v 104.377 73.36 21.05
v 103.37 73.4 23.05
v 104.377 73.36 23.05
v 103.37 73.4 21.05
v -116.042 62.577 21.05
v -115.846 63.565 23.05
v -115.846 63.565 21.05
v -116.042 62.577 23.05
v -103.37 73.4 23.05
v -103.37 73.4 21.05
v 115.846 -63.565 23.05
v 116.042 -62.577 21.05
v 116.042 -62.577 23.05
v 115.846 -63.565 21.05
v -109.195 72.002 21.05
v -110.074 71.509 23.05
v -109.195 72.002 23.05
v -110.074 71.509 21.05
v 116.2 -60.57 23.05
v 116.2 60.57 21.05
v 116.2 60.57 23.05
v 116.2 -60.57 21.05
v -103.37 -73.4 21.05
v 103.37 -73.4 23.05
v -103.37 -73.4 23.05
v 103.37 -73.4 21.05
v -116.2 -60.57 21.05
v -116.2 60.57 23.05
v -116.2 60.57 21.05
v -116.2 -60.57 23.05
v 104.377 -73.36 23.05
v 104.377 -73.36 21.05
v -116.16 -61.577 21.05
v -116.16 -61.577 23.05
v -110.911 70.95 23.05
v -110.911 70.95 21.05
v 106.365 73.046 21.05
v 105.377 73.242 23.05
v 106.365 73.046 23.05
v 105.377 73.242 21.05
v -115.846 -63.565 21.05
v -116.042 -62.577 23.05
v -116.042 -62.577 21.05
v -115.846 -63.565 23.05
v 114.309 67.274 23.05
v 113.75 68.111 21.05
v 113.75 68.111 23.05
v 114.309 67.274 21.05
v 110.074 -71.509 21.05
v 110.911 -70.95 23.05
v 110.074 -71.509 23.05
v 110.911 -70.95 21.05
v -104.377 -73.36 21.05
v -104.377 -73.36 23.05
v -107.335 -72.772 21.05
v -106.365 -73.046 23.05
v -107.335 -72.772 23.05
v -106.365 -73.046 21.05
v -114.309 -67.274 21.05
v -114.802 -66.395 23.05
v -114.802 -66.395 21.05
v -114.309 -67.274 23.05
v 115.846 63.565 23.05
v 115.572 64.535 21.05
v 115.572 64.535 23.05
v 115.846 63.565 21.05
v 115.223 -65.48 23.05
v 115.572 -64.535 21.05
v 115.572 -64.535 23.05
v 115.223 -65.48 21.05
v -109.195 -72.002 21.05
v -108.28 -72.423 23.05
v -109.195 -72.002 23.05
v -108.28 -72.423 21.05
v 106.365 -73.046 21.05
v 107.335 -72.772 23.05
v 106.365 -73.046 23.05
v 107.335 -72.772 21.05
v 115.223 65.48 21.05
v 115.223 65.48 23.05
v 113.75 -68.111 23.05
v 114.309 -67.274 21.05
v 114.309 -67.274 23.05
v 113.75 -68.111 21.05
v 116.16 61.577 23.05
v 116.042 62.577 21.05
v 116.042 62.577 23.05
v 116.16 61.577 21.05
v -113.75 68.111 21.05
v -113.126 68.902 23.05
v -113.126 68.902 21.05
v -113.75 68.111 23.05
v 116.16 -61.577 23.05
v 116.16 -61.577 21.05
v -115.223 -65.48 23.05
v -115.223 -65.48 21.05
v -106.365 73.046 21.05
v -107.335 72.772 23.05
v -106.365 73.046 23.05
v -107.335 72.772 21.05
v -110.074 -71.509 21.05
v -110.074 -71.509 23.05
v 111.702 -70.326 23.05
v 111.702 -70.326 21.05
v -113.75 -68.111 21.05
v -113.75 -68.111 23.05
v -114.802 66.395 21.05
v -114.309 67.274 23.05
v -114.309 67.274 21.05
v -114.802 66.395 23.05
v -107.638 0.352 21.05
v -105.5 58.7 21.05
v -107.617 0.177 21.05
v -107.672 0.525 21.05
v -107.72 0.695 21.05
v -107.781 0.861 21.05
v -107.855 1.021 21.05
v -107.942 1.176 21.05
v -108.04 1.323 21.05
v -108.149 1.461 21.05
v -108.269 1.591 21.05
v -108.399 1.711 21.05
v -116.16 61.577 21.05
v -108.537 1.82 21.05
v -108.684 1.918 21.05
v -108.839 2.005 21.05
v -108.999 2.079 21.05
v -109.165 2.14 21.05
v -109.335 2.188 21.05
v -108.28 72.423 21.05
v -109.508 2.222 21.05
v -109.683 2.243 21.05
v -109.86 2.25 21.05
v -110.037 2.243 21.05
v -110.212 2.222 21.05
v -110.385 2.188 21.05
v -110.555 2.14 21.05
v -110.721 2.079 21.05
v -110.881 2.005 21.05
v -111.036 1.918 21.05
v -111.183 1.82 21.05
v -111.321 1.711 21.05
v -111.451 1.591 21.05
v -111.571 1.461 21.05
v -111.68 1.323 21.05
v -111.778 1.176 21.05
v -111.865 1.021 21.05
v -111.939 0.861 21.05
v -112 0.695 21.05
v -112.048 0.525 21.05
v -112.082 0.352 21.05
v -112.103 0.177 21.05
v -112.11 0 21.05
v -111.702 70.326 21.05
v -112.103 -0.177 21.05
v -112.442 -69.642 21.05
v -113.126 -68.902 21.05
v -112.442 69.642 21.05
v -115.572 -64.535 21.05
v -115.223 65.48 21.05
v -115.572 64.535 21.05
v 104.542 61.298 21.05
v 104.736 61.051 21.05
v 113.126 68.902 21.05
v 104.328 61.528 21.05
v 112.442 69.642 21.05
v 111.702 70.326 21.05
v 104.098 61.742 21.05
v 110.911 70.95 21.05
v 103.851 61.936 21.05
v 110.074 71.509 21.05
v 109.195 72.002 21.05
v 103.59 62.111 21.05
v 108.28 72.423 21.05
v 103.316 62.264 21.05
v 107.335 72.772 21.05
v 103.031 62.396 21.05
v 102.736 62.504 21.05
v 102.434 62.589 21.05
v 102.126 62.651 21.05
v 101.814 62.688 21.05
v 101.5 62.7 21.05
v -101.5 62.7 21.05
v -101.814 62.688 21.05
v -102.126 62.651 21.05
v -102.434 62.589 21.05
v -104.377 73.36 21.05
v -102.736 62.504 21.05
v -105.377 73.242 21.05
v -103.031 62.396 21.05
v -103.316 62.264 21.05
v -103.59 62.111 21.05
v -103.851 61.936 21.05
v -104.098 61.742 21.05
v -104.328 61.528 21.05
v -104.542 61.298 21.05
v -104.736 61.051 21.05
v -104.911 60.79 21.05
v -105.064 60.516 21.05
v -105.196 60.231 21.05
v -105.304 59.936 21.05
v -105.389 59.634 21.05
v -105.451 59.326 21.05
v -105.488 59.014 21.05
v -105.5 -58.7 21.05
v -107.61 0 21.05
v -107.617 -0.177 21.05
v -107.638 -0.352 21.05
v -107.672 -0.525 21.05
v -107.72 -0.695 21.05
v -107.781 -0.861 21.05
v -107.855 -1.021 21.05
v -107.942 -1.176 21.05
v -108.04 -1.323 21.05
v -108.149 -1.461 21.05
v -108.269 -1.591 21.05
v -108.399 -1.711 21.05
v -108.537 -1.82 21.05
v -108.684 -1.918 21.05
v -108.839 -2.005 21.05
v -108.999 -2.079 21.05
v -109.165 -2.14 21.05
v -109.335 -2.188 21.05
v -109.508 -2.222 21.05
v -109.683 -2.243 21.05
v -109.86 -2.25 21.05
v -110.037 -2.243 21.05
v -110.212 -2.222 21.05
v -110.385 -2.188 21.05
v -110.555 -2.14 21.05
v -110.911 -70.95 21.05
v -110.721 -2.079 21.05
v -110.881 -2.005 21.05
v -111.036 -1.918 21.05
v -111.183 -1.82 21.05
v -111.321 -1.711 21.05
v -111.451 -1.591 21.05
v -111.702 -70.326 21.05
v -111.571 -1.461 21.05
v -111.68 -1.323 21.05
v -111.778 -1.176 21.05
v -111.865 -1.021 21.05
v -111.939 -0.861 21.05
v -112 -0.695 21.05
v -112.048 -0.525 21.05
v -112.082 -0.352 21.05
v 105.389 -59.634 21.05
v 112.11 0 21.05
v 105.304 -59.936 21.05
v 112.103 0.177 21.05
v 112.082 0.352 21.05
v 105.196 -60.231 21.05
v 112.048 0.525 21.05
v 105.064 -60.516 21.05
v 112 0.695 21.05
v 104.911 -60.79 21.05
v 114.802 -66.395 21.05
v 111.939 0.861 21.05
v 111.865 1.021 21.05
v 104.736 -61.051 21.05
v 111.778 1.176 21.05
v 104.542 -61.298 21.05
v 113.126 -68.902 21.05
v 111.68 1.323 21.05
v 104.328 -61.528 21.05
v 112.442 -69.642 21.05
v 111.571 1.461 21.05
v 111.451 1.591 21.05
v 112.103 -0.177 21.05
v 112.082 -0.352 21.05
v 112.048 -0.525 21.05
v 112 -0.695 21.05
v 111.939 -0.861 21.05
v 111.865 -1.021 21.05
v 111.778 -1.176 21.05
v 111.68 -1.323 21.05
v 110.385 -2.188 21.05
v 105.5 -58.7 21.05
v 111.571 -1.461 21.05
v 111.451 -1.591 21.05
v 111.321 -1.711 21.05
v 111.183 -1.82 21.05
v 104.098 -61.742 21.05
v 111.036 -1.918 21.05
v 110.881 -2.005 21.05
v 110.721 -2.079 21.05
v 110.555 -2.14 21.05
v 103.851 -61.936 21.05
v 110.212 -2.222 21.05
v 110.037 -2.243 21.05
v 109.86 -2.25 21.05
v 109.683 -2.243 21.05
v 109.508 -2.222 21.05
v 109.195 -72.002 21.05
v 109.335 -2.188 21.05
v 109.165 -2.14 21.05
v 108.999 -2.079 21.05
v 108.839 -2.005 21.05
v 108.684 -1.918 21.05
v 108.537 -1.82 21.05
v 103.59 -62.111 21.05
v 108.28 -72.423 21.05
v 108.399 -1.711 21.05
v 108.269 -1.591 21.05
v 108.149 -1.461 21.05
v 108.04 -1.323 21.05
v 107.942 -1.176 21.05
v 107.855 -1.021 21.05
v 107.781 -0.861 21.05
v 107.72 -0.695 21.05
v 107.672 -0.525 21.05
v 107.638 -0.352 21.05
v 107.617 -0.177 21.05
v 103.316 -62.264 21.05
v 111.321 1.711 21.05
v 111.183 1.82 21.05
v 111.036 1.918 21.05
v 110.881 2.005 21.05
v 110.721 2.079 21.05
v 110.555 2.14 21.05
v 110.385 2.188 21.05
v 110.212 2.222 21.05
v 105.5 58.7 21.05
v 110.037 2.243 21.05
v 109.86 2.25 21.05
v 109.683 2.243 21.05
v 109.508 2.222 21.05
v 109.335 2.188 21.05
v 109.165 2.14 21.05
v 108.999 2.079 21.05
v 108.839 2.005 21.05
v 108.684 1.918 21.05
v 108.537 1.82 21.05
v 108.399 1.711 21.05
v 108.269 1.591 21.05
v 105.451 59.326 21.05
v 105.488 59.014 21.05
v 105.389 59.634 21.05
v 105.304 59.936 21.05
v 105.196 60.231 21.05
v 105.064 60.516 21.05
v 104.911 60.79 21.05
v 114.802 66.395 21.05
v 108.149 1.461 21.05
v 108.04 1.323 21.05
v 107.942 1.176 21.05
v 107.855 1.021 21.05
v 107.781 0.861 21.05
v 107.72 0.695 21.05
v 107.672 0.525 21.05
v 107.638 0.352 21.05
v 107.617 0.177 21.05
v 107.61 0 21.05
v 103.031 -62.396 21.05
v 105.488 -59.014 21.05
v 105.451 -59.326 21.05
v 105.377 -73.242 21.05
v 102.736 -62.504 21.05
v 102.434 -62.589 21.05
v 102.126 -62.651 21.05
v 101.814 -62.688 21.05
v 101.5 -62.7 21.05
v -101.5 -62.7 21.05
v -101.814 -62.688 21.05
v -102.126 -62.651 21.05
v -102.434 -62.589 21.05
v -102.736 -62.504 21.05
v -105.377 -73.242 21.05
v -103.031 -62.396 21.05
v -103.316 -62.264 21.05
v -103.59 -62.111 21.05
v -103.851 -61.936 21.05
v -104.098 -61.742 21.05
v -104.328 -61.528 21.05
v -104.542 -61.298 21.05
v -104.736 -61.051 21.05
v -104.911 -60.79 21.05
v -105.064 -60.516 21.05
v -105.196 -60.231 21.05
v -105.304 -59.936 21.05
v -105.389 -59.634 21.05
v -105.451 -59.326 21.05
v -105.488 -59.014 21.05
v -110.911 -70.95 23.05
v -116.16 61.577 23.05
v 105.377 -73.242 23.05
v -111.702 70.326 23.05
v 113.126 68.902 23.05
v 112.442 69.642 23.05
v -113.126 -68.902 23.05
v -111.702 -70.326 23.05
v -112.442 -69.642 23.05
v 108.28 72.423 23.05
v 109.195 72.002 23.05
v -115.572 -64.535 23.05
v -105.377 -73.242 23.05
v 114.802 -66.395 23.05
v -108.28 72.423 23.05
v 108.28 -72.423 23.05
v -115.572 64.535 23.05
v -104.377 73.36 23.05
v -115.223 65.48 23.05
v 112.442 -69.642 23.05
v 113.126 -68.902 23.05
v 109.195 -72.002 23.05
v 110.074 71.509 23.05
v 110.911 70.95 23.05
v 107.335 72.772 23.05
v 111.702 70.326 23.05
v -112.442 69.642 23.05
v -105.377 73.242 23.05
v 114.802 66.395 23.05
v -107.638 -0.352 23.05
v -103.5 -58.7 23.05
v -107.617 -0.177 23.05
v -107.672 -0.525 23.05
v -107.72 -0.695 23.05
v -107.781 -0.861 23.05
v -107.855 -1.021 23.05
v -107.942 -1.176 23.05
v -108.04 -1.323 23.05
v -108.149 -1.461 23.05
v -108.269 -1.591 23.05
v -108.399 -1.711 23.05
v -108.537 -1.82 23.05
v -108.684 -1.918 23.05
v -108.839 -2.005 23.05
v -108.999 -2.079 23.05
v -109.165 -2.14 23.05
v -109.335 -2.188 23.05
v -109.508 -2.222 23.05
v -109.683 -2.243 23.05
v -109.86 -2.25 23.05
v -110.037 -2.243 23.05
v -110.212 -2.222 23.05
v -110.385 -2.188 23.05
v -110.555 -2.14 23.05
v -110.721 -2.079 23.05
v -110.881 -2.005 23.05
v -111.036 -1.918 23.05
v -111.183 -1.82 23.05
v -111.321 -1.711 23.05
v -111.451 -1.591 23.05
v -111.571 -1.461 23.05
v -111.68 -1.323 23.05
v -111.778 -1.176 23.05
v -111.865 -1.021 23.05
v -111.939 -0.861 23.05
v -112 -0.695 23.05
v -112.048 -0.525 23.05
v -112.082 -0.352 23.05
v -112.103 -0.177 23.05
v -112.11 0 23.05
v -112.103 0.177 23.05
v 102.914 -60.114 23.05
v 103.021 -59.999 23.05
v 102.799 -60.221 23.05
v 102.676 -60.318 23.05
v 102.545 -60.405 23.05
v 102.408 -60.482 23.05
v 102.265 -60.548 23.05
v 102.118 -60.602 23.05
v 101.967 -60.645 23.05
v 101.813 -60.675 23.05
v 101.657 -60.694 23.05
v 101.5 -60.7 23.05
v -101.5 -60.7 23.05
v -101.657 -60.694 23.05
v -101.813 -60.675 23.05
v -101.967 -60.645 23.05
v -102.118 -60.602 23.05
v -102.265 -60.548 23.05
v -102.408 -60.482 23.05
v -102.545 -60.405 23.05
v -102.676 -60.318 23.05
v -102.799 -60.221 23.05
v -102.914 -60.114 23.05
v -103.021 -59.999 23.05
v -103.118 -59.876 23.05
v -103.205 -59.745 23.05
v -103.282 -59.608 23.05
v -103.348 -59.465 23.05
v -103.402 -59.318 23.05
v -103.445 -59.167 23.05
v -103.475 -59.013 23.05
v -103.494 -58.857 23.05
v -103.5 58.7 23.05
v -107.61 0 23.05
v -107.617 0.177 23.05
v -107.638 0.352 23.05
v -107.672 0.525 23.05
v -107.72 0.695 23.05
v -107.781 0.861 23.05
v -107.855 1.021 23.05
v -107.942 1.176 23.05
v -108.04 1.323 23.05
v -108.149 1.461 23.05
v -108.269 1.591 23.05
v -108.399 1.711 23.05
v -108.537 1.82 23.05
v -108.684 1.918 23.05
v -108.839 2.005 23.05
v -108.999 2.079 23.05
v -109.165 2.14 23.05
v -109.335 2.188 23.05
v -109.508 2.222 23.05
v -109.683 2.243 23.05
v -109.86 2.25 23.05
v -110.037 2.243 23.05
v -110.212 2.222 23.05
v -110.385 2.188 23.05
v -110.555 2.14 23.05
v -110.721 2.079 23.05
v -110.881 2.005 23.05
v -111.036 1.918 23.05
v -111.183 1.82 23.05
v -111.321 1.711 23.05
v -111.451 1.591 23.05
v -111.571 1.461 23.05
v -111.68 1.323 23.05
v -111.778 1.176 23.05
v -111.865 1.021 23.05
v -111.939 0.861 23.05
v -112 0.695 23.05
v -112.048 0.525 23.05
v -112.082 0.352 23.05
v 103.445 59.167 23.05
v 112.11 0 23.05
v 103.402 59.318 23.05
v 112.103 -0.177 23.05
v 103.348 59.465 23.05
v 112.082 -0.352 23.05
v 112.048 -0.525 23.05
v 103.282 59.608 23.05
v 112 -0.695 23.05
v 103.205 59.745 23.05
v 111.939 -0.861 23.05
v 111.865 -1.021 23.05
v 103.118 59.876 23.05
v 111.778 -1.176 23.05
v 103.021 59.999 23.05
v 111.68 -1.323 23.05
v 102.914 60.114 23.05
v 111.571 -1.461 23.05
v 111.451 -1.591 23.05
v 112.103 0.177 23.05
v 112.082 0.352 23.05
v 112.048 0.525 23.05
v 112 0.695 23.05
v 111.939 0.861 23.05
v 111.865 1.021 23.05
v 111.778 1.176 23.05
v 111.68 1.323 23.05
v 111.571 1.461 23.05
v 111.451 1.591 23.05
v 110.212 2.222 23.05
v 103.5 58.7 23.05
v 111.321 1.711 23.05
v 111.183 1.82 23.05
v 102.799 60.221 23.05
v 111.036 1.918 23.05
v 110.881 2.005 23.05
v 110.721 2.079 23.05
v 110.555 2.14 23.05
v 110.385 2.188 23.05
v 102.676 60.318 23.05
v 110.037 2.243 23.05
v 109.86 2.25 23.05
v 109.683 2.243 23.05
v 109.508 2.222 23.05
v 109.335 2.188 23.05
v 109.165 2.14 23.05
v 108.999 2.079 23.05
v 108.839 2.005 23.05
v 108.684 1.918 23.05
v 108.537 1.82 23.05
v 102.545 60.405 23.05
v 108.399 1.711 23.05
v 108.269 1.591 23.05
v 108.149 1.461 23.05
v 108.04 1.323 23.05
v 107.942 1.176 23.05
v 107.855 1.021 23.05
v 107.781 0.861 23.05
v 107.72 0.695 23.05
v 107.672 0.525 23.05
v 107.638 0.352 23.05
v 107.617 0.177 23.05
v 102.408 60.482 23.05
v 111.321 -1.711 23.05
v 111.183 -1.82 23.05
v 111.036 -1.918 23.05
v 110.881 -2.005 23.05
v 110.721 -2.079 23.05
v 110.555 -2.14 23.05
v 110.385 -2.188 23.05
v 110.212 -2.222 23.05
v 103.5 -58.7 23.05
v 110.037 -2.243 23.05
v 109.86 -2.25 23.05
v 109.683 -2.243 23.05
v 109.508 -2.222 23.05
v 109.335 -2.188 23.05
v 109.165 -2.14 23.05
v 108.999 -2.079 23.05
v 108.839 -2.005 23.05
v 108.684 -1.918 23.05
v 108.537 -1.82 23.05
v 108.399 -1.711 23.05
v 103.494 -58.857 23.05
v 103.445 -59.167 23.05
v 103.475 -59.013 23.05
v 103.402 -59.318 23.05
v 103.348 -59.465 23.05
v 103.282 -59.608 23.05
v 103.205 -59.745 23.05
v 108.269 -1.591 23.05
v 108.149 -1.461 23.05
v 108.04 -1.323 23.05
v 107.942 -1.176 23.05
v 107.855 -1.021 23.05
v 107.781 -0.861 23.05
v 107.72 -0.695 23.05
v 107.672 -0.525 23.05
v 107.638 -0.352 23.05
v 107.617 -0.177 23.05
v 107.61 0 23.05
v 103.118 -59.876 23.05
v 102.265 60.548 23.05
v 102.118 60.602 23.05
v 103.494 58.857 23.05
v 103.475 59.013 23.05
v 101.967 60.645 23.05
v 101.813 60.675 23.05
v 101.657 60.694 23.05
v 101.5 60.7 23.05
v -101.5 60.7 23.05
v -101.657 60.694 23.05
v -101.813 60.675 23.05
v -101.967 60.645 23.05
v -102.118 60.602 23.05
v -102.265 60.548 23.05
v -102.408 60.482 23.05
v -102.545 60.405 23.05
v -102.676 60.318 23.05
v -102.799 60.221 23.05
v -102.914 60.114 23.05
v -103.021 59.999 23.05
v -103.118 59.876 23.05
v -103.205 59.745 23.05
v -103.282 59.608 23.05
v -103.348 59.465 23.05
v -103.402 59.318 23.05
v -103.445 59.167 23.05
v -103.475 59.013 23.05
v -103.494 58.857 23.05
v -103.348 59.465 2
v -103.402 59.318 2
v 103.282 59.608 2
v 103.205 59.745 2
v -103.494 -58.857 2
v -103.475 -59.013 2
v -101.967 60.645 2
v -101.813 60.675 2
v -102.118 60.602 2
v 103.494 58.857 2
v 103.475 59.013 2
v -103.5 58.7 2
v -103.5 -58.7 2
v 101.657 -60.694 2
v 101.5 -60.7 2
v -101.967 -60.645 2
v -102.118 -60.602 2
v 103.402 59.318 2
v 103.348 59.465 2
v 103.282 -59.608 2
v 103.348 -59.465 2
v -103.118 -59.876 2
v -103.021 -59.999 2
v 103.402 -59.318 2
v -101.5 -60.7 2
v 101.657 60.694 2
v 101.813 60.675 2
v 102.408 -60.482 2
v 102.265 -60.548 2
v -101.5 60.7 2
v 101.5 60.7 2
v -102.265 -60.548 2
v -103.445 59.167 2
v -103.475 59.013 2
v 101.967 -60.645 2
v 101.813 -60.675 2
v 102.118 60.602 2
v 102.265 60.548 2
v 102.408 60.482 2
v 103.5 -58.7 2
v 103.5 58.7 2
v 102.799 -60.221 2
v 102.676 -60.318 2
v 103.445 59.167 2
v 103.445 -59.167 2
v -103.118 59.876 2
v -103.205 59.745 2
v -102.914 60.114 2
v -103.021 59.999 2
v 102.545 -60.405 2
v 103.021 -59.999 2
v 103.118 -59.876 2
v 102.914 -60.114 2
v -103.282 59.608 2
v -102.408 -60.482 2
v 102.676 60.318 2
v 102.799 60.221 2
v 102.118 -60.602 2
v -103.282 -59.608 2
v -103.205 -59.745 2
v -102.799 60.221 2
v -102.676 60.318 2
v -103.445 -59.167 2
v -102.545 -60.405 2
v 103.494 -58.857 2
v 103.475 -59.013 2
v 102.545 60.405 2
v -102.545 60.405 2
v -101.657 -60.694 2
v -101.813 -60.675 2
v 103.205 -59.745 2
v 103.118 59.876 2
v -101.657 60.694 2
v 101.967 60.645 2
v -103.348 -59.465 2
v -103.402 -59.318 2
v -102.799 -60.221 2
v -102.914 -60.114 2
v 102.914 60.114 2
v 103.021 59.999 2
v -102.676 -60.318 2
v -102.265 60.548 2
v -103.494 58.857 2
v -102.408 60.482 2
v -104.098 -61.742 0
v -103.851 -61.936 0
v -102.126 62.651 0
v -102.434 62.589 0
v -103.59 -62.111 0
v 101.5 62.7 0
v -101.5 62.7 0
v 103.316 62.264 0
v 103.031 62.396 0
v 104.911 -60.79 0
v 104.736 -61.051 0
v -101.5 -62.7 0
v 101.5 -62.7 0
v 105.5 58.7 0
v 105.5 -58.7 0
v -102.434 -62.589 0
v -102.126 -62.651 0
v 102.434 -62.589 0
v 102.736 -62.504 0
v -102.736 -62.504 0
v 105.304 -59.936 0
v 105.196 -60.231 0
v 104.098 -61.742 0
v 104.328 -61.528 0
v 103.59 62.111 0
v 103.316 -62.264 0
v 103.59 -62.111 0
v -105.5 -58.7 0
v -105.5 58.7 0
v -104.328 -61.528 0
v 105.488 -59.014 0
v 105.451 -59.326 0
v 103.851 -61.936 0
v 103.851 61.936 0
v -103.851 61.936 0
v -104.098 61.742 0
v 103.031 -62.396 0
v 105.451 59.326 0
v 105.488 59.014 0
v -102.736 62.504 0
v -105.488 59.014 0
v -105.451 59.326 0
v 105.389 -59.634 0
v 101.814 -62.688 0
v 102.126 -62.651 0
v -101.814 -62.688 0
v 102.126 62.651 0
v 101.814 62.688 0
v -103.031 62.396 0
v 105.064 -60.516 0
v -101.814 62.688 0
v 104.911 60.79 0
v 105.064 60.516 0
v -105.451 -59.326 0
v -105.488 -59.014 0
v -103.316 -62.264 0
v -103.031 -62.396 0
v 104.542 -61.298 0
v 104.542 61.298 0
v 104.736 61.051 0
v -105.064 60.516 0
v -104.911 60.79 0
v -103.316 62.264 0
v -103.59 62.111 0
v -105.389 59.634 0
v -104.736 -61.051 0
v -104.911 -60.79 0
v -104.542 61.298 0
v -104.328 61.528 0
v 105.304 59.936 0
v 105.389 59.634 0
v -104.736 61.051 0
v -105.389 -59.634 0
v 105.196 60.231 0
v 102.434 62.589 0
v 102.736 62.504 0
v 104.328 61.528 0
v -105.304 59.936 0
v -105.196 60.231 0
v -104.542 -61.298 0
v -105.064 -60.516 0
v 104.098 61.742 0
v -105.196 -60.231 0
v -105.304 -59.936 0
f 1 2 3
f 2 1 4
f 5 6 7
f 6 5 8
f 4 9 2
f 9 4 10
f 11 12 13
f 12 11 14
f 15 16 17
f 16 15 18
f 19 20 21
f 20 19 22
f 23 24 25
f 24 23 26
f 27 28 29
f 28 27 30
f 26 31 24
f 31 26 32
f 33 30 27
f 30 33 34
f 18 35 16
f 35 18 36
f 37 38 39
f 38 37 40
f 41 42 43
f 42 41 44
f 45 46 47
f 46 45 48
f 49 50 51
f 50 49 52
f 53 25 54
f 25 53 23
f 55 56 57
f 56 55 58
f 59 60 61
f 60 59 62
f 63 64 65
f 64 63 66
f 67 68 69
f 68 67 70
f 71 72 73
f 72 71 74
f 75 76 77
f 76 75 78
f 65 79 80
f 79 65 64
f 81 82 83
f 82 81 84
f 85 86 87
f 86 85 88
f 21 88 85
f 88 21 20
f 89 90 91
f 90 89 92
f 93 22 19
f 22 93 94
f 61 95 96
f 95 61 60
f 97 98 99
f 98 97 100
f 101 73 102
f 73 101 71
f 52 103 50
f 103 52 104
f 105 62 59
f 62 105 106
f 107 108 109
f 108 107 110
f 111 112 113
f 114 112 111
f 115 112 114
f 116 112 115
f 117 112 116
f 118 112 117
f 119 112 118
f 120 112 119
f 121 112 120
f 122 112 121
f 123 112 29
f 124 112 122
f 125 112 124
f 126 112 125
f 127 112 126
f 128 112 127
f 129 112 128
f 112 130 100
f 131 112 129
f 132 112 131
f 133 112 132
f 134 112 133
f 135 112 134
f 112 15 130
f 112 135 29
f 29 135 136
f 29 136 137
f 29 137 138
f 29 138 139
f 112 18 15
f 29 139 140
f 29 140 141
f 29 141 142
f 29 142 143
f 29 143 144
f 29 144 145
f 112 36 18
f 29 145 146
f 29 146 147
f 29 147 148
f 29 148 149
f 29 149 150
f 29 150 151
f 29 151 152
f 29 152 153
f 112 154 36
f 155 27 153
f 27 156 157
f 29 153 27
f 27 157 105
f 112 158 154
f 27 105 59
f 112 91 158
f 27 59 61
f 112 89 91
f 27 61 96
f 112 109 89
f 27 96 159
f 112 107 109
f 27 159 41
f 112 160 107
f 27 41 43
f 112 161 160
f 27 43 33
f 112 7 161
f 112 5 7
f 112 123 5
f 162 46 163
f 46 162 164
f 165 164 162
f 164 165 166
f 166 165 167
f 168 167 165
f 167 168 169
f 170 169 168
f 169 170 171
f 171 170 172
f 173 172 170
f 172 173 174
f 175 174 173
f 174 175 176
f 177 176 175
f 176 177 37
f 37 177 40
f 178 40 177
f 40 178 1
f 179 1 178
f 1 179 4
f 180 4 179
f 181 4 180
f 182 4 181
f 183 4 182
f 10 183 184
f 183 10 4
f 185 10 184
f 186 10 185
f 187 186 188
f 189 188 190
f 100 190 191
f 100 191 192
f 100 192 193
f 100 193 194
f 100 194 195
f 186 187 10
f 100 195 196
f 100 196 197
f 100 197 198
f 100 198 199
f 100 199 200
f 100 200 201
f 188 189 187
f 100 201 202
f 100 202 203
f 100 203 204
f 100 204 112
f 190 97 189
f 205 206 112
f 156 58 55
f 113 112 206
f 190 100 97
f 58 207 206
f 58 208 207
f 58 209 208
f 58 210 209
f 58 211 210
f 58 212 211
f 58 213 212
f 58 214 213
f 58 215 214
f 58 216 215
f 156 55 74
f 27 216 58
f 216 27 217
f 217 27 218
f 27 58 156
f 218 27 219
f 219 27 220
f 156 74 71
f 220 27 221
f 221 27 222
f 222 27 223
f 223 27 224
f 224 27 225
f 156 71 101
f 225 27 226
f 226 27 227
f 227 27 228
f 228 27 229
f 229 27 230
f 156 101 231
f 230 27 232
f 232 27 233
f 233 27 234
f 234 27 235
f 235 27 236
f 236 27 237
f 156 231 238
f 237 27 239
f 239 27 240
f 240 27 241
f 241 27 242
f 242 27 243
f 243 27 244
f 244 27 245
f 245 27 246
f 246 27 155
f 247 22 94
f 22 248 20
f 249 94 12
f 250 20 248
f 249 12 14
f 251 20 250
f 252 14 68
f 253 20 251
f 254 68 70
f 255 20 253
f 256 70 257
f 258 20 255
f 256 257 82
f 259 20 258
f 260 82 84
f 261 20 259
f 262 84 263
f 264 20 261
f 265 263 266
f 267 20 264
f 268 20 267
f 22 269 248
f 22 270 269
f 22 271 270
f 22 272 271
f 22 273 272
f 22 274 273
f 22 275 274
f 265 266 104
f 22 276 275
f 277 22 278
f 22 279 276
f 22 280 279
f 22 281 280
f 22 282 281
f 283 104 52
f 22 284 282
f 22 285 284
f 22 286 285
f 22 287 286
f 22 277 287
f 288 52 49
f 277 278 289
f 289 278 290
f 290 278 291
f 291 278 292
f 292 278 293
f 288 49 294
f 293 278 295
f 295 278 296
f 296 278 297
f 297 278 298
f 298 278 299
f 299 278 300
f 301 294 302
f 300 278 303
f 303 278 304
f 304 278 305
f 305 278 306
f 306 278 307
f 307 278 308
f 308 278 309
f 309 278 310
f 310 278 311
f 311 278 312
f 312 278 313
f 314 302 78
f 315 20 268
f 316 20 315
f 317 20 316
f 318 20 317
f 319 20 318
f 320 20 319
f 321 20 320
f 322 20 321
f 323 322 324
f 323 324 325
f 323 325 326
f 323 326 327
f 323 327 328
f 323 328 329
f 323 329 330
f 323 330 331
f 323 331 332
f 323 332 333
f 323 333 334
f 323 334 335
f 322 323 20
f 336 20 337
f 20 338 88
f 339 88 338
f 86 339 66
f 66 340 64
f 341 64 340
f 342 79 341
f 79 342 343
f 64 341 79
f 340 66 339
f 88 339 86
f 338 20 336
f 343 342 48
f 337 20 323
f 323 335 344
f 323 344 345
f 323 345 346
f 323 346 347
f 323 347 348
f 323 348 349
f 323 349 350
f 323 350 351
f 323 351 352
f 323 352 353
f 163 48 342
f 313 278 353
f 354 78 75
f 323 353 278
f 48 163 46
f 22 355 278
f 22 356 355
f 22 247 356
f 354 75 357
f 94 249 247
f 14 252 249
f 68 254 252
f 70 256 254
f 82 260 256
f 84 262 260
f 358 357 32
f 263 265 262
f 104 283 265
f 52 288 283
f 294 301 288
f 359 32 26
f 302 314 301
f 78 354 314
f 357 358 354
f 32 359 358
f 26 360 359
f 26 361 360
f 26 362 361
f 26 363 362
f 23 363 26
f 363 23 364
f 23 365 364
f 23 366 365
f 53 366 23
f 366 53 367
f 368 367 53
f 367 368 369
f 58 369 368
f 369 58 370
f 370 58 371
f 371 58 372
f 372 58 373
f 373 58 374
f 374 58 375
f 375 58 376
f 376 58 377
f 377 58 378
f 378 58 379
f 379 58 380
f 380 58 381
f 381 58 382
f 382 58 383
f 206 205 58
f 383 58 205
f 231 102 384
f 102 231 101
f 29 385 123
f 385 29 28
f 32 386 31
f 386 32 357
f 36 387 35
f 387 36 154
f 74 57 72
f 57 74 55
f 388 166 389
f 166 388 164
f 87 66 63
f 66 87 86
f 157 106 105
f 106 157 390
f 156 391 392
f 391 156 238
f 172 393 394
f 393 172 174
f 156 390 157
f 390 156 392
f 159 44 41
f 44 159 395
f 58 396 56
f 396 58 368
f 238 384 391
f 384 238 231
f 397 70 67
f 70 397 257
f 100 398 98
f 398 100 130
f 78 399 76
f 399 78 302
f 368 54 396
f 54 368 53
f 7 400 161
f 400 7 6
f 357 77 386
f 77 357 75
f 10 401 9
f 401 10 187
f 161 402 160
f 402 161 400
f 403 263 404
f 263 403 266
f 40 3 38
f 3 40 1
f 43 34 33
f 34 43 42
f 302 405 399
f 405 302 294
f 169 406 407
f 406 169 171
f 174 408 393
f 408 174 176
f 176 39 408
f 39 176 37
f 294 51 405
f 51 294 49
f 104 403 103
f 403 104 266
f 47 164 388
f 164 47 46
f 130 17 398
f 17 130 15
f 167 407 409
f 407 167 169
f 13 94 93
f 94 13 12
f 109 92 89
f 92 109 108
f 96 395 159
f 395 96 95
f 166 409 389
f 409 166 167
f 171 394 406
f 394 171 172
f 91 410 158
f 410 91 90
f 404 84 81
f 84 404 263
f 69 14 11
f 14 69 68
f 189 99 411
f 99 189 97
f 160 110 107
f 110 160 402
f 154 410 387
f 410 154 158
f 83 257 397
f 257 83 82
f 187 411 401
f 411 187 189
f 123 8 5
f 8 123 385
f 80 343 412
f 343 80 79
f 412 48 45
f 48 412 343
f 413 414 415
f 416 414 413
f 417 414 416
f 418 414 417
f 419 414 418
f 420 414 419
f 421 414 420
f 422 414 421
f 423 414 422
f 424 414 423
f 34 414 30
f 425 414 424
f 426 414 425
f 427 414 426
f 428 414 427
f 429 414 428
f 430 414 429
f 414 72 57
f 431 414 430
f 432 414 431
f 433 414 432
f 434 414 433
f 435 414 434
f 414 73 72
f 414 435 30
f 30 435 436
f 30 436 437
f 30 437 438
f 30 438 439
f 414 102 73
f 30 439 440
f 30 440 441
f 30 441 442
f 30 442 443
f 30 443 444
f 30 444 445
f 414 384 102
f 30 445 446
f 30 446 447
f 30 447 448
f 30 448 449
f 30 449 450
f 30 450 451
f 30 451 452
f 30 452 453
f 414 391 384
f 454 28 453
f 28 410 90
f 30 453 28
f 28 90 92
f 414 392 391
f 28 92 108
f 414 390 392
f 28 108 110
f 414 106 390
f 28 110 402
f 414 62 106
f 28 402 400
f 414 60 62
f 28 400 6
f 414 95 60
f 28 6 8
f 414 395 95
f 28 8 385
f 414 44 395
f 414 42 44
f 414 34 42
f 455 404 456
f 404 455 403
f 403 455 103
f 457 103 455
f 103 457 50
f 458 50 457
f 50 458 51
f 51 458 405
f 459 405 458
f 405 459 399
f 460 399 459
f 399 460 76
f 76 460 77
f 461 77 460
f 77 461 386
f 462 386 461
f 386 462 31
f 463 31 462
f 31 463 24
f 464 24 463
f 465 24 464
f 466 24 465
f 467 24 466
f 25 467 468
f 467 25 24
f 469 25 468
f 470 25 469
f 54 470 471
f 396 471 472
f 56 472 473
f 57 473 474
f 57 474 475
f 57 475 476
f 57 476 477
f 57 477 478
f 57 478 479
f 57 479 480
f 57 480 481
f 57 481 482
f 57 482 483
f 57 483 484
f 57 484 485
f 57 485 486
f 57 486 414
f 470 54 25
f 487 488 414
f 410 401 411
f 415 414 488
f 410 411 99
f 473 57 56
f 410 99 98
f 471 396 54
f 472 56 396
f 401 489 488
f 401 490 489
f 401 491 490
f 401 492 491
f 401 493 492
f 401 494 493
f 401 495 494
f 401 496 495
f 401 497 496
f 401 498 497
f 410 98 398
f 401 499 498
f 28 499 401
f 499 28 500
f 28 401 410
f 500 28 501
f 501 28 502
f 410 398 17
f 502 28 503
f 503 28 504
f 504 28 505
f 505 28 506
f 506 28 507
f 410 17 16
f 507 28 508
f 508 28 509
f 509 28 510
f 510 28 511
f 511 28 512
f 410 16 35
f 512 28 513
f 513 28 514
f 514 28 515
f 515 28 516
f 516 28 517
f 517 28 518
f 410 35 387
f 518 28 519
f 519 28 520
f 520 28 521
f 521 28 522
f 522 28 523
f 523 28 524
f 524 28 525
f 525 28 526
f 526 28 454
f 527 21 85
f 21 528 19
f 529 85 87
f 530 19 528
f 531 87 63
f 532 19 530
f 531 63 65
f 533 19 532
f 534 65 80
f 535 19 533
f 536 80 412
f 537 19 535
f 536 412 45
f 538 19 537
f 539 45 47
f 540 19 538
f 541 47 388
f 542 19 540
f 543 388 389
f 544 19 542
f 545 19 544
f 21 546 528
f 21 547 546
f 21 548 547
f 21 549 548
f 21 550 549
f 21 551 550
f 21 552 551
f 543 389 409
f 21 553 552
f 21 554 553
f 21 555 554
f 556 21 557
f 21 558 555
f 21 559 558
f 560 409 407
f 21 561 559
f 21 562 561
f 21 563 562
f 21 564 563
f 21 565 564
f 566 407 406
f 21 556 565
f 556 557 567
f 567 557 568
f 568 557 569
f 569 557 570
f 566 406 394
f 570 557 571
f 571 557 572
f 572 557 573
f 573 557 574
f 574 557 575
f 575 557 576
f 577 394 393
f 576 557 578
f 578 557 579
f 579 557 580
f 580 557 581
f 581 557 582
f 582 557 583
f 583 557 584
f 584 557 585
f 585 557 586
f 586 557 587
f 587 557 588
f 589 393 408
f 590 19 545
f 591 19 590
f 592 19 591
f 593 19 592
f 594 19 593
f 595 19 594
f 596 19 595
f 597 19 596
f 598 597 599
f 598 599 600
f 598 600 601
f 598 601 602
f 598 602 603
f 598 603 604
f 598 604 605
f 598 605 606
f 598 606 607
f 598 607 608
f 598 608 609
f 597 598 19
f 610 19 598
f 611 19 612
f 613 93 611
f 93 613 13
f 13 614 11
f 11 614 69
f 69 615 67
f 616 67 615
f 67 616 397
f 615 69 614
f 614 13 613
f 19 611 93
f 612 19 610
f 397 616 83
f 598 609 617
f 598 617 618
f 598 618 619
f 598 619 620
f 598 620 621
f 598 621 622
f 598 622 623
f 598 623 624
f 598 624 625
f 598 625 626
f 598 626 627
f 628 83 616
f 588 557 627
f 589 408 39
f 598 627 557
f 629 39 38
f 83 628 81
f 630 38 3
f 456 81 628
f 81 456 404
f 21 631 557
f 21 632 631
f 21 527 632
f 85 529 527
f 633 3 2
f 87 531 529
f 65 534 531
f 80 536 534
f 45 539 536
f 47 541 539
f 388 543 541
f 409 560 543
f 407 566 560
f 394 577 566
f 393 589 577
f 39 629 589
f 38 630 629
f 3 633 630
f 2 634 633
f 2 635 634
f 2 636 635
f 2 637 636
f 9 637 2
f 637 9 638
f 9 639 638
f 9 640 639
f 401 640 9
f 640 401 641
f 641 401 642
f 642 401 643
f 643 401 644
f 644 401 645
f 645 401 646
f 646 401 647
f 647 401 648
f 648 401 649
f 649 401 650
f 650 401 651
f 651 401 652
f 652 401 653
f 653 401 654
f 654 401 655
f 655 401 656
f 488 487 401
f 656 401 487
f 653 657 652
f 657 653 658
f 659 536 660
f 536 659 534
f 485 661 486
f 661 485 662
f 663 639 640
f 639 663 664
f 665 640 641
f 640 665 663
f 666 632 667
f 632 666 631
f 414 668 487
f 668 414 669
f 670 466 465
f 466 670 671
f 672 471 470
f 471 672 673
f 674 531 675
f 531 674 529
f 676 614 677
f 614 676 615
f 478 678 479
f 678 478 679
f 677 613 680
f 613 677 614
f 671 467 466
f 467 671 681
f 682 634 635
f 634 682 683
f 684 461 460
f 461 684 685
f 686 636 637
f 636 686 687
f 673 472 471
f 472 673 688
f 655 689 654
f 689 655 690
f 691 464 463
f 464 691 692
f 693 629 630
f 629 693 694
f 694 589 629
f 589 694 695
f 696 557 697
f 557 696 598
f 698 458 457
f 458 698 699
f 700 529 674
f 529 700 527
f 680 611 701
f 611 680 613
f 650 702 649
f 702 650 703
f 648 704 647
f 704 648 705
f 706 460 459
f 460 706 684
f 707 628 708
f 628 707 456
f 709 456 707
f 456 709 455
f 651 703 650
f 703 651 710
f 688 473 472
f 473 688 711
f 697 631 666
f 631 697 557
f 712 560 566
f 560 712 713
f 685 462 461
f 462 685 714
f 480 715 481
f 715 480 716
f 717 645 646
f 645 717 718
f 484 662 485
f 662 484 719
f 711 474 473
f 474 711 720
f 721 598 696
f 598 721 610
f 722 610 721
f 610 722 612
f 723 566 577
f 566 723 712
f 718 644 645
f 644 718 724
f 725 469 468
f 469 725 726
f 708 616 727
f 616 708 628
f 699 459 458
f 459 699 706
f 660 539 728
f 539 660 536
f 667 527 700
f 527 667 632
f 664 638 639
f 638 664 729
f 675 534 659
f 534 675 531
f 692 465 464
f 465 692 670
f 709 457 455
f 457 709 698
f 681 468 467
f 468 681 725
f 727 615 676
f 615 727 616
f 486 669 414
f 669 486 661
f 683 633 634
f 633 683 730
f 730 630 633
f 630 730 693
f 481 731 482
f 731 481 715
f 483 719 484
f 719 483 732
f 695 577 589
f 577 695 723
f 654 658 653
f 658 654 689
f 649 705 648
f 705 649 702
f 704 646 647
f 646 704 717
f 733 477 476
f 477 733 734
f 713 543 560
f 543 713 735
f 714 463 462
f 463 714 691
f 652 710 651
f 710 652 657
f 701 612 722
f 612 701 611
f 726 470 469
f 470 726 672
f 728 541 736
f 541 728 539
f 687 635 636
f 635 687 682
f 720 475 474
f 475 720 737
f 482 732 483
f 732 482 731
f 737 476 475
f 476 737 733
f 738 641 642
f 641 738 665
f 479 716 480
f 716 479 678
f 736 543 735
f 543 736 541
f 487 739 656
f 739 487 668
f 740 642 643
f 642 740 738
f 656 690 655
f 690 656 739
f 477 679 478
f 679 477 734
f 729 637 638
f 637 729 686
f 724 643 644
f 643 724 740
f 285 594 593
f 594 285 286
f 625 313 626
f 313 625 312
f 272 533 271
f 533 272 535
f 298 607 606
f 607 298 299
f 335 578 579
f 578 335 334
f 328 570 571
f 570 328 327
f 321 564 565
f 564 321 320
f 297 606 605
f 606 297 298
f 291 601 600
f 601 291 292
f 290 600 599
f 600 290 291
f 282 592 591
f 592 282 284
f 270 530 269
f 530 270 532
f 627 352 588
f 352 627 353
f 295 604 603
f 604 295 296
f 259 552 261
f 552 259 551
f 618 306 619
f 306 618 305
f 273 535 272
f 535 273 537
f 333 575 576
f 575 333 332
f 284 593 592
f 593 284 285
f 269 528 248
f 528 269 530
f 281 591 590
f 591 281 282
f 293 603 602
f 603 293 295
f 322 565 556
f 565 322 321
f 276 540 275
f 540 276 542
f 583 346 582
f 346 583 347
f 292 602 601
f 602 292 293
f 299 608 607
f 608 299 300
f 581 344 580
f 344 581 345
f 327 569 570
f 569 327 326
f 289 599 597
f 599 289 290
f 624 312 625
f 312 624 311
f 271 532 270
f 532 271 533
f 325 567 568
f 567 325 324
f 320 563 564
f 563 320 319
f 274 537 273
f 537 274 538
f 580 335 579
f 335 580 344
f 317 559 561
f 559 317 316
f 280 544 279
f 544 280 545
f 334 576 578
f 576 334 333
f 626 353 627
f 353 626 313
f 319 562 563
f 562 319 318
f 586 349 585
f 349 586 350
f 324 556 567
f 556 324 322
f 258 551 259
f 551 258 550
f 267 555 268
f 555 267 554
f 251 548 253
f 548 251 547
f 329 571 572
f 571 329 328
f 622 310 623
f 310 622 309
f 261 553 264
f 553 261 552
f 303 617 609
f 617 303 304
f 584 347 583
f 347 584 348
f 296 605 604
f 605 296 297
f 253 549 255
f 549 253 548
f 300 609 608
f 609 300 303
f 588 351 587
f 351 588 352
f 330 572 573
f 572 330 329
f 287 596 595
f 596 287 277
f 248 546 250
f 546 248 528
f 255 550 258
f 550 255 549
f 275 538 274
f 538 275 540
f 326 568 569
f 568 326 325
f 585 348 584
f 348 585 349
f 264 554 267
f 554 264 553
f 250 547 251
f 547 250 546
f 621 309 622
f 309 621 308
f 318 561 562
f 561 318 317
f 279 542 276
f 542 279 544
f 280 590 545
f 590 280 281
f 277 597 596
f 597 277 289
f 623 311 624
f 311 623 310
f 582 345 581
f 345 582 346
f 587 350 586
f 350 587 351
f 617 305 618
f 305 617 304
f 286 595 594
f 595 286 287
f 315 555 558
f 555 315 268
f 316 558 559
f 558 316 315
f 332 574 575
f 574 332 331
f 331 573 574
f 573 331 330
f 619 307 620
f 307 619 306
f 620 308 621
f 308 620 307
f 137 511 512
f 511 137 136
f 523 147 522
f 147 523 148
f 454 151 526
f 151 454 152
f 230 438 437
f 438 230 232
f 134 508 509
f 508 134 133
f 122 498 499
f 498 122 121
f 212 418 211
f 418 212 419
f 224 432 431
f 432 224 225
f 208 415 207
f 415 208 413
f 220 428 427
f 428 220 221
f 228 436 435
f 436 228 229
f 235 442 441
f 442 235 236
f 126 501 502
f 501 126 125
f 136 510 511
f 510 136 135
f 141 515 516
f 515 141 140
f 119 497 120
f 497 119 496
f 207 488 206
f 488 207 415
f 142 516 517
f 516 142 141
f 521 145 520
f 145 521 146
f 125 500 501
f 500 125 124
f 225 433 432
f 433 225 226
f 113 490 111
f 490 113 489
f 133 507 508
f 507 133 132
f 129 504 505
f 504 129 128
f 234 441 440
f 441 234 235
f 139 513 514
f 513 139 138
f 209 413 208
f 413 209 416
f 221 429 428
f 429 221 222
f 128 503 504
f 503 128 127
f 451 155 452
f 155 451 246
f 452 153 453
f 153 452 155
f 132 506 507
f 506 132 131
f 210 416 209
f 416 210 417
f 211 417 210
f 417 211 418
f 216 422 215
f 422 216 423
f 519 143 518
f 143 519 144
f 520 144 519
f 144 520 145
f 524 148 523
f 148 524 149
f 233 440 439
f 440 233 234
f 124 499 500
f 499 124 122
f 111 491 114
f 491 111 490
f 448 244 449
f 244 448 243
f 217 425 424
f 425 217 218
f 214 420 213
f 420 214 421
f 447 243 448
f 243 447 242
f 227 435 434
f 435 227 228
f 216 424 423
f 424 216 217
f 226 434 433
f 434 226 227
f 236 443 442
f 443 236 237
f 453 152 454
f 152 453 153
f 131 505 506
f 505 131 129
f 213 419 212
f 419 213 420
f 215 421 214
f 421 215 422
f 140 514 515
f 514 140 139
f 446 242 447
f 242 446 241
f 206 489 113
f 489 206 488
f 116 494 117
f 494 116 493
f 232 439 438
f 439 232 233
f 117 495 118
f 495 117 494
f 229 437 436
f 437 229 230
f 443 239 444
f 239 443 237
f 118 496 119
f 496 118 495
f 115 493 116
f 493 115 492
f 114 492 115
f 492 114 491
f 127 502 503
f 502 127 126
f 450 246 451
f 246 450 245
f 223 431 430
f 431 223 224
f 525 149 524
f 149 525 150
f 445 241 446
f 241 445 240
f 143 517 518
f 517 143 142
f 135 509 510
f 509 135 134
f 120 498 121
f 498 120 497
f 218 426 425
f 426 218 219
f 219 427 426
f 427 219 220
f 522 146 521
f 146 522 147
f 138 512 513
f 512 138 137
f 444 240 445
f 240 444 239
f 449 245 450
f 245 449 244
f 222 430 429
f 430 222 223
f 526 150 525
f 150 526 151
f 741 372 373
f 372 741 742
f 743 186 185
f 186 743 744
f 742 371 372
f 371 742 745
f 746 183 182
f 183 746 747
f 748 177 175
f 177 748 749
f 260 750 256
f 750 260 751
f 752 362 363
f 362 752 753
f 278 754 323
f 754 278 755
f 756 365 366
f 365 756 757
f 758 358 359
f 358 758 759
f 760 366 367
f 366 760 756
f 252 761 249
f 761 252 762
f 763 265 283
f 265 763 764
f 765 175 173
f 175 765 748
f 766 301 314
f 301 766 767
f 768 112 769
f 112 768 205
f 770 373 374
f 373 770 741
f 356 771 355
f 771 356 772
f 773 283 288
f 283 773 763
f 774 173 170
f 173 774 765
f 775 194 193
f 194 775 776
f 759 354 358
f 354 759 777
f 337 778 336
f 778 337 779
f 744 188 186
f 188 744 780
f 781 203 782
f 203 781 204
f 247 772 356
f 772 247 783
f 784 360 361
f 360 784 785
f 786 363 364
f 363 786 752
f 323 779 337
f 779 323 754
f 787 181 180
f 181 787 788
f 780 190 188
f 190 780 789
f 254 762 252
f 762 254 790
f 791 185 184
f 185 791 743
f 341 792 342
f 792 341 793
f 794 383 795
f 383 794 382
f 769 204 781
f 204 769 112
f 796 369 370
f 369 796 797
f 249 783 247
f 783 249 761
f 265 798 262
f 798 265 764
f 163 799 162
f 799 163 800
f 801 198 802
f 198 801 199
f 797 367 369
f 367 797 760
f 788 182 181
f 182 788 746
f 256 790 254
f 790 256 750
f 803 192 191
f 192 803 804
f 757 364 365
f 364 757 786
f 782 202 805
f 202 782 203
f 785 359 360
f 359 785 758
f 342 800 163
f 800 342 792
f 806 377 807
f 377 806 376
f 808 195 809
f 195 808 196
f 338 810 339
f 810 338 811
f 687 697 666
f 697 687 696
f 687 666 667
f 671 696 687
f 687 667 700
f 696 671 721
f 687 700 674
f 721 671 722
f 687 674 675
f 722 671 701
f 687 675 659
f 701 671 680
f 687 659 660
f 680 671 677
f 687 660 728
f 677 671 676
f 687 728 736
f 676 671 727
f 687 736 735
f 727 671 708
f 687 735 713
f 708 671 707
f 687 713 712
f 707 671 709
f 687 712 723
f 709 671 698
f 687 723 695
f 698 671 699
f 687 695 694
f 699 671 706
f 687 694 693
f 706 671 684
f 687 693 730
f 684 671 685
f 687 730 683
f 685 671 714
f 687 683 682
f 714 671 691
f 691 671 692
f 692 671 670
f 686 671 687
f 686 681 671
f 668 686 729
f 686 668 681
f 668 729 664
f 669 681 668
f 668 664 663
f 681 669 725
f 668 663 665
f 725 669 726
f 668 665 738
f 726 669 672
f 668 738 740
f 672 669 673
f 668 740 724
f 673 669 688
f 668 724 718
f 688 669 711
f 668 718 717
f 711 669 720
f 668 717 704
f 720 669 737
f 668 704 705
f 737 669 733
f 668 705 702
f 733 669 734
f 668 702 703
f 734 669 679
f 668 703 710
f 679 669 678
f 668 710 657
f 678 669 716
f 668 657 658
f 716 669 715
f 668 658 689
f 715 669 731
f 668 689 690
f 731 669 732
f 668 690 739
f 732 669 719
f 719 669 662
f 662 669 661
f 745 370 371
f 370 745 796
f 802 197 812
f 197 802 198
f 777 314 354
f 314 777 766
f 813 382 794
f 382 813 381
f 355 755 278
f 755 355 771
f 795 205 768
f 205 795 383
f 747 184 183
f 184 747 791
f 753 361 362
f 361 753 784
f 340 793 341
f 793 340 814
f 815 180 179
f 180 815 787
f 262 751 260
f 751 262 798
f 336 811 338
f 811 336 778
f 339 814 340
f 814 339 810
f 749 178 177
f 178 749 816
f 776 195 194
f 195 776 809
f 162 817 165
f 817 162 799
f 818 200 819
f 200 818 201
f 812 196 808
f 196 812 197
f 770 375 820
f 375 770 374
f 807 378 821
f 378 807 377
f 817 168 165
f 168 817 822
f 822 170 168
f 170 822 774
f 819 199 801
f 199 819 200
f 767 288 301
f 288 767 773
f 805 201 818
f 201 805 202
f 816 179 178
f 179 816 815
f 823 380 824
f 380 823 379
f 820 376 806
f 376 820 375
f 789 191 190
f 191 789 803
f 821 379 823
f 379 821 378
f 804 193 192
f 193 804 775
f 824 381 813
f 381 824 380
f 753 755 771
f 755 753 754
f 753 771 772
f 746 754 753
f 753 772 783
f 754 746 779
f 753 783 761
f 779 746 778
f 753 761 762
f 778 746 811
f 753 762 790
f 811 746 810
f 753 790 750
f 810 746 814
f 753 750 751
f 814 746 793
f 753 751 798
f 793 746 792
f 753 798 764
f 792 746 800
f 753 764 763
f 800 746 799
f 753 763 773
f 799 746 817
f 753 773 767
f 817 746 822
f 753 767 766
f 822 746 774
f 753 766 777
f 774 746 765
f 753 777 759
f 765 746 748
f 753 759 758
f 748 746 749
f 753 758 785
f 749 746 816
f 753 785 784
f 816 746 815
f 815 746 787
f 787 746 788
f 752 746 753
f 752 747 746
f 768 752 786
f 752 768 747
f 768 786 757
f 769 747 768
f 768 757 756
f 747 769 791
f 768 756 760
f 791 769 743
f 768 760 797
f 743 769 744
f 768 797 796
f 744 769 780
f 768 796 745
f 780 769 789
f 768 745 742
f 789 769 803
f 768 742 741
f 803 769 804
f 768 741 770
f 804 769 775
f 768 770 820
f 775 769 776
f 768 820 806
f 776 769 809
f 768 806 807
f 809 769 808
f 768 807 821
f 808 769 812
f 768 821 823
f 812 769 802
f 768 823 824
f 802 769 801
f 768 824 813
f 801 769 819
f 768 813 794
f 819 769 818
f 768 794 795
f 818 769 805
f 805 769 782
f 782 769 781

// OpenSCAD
// ==========================================
// Humidifier Refill Cover — Box Extension
// ==========================================
// Flat flange FRAME screws to cabinet (rectangular
// opening cut through center). Box extends outward
// from the opening, sealed on the far end.
//
// Print: sealed top on bed, walls build up, flange on top.
//        Opening faces UP. No bridging needed.
// Install: flip over, screw flange to cabinet, box hangs down.
// ==========================================

$fn = 80;

// === COVER DIMENSIONS (from Mike's STEP) ===
cover_w        = 232.4;     // 9.15" total width
cover_d        = 146.8;     // 5.78" total depth
cover_t        = 2.0;       // flange thickness
corner_r       = 12.83;     // 0.505" corner radius

// Screw holes at (±4.325", 0)
screw_hole_r   = 2.25;
screw_x        = 109.86;

// === BOX EXTENSION ===
flange_border  = 12.7;      // 1/2" flat border all around
box_ext        = 19.05;     // 3/4" outward
box_wall       = 2.0;

// Opening dimensions
open_w         = cover_w - 2 * flange_border;   // 207mm
open_d         = cover_d - 2 * flange_border;   // 121.4mm
open_r         = max(corner_r - flange_border, 2);

// Total height of the assembled part
total_h        = cover_t + box_ext + box_wall;   // ~23mm

module rounded_rect(w, d, h, r) {
    hull() {
        for (x = [-w/2 + r, w/2 - r])
            for (y = [-d/2 + r, d/2 - r])
                translate([x, y, 0])
                    cylinder(r = r, h = h);
    }
}

module cover_assembly() {
    // PART 1: Flange frame (plate with rectangular hole)
    difference() {
        rounded_rect(cover_w, cover_d, cover_t, corner_r);
        translate([0, 0, -0.1])
            rounded_rect(open_w, open_d, cover_t + 0.2, open_r);
        translate([screw_x, 0, -0.1])
            cylinder(r = screw_hole_r, h = cover_t + 0.2);
        translate([-screw_x, 0, -0.1])
            cylinder(r = screw_hole_r, h = cover_t + 0.2);
    }

    // PART 2: Box walls (rising from flange, around the opening)
    translate([0, 0, cover_t])
        difference() {
            rounded_rect(open_w + 2 * box_wall, open_d + 2 * box_wall,
                         box_ext, open_r + box_wall);
            translate([0, 0, -0.1])
                rounded_rect(open_w, open_d,
                             box_ext + 0.2, open_r);
        }

    // PART 3: Sealed top (closes the far end of the box)
    translate([0, 0, cover_t + box_ext])
        rounded_rect(open_w + 2 * box_wall, open_d + 2 * box_wall,
                     box_wall, open_r + box_wall);
}

// === FLIPPED FOR PRINTING ===
// Rotate 180° around X so sealed top is on the bed,
// then shift up so bottom sits at z=0
rotate([180, 0, 0])
    translate([0, 0, -total_h])
        cover_assembly();
